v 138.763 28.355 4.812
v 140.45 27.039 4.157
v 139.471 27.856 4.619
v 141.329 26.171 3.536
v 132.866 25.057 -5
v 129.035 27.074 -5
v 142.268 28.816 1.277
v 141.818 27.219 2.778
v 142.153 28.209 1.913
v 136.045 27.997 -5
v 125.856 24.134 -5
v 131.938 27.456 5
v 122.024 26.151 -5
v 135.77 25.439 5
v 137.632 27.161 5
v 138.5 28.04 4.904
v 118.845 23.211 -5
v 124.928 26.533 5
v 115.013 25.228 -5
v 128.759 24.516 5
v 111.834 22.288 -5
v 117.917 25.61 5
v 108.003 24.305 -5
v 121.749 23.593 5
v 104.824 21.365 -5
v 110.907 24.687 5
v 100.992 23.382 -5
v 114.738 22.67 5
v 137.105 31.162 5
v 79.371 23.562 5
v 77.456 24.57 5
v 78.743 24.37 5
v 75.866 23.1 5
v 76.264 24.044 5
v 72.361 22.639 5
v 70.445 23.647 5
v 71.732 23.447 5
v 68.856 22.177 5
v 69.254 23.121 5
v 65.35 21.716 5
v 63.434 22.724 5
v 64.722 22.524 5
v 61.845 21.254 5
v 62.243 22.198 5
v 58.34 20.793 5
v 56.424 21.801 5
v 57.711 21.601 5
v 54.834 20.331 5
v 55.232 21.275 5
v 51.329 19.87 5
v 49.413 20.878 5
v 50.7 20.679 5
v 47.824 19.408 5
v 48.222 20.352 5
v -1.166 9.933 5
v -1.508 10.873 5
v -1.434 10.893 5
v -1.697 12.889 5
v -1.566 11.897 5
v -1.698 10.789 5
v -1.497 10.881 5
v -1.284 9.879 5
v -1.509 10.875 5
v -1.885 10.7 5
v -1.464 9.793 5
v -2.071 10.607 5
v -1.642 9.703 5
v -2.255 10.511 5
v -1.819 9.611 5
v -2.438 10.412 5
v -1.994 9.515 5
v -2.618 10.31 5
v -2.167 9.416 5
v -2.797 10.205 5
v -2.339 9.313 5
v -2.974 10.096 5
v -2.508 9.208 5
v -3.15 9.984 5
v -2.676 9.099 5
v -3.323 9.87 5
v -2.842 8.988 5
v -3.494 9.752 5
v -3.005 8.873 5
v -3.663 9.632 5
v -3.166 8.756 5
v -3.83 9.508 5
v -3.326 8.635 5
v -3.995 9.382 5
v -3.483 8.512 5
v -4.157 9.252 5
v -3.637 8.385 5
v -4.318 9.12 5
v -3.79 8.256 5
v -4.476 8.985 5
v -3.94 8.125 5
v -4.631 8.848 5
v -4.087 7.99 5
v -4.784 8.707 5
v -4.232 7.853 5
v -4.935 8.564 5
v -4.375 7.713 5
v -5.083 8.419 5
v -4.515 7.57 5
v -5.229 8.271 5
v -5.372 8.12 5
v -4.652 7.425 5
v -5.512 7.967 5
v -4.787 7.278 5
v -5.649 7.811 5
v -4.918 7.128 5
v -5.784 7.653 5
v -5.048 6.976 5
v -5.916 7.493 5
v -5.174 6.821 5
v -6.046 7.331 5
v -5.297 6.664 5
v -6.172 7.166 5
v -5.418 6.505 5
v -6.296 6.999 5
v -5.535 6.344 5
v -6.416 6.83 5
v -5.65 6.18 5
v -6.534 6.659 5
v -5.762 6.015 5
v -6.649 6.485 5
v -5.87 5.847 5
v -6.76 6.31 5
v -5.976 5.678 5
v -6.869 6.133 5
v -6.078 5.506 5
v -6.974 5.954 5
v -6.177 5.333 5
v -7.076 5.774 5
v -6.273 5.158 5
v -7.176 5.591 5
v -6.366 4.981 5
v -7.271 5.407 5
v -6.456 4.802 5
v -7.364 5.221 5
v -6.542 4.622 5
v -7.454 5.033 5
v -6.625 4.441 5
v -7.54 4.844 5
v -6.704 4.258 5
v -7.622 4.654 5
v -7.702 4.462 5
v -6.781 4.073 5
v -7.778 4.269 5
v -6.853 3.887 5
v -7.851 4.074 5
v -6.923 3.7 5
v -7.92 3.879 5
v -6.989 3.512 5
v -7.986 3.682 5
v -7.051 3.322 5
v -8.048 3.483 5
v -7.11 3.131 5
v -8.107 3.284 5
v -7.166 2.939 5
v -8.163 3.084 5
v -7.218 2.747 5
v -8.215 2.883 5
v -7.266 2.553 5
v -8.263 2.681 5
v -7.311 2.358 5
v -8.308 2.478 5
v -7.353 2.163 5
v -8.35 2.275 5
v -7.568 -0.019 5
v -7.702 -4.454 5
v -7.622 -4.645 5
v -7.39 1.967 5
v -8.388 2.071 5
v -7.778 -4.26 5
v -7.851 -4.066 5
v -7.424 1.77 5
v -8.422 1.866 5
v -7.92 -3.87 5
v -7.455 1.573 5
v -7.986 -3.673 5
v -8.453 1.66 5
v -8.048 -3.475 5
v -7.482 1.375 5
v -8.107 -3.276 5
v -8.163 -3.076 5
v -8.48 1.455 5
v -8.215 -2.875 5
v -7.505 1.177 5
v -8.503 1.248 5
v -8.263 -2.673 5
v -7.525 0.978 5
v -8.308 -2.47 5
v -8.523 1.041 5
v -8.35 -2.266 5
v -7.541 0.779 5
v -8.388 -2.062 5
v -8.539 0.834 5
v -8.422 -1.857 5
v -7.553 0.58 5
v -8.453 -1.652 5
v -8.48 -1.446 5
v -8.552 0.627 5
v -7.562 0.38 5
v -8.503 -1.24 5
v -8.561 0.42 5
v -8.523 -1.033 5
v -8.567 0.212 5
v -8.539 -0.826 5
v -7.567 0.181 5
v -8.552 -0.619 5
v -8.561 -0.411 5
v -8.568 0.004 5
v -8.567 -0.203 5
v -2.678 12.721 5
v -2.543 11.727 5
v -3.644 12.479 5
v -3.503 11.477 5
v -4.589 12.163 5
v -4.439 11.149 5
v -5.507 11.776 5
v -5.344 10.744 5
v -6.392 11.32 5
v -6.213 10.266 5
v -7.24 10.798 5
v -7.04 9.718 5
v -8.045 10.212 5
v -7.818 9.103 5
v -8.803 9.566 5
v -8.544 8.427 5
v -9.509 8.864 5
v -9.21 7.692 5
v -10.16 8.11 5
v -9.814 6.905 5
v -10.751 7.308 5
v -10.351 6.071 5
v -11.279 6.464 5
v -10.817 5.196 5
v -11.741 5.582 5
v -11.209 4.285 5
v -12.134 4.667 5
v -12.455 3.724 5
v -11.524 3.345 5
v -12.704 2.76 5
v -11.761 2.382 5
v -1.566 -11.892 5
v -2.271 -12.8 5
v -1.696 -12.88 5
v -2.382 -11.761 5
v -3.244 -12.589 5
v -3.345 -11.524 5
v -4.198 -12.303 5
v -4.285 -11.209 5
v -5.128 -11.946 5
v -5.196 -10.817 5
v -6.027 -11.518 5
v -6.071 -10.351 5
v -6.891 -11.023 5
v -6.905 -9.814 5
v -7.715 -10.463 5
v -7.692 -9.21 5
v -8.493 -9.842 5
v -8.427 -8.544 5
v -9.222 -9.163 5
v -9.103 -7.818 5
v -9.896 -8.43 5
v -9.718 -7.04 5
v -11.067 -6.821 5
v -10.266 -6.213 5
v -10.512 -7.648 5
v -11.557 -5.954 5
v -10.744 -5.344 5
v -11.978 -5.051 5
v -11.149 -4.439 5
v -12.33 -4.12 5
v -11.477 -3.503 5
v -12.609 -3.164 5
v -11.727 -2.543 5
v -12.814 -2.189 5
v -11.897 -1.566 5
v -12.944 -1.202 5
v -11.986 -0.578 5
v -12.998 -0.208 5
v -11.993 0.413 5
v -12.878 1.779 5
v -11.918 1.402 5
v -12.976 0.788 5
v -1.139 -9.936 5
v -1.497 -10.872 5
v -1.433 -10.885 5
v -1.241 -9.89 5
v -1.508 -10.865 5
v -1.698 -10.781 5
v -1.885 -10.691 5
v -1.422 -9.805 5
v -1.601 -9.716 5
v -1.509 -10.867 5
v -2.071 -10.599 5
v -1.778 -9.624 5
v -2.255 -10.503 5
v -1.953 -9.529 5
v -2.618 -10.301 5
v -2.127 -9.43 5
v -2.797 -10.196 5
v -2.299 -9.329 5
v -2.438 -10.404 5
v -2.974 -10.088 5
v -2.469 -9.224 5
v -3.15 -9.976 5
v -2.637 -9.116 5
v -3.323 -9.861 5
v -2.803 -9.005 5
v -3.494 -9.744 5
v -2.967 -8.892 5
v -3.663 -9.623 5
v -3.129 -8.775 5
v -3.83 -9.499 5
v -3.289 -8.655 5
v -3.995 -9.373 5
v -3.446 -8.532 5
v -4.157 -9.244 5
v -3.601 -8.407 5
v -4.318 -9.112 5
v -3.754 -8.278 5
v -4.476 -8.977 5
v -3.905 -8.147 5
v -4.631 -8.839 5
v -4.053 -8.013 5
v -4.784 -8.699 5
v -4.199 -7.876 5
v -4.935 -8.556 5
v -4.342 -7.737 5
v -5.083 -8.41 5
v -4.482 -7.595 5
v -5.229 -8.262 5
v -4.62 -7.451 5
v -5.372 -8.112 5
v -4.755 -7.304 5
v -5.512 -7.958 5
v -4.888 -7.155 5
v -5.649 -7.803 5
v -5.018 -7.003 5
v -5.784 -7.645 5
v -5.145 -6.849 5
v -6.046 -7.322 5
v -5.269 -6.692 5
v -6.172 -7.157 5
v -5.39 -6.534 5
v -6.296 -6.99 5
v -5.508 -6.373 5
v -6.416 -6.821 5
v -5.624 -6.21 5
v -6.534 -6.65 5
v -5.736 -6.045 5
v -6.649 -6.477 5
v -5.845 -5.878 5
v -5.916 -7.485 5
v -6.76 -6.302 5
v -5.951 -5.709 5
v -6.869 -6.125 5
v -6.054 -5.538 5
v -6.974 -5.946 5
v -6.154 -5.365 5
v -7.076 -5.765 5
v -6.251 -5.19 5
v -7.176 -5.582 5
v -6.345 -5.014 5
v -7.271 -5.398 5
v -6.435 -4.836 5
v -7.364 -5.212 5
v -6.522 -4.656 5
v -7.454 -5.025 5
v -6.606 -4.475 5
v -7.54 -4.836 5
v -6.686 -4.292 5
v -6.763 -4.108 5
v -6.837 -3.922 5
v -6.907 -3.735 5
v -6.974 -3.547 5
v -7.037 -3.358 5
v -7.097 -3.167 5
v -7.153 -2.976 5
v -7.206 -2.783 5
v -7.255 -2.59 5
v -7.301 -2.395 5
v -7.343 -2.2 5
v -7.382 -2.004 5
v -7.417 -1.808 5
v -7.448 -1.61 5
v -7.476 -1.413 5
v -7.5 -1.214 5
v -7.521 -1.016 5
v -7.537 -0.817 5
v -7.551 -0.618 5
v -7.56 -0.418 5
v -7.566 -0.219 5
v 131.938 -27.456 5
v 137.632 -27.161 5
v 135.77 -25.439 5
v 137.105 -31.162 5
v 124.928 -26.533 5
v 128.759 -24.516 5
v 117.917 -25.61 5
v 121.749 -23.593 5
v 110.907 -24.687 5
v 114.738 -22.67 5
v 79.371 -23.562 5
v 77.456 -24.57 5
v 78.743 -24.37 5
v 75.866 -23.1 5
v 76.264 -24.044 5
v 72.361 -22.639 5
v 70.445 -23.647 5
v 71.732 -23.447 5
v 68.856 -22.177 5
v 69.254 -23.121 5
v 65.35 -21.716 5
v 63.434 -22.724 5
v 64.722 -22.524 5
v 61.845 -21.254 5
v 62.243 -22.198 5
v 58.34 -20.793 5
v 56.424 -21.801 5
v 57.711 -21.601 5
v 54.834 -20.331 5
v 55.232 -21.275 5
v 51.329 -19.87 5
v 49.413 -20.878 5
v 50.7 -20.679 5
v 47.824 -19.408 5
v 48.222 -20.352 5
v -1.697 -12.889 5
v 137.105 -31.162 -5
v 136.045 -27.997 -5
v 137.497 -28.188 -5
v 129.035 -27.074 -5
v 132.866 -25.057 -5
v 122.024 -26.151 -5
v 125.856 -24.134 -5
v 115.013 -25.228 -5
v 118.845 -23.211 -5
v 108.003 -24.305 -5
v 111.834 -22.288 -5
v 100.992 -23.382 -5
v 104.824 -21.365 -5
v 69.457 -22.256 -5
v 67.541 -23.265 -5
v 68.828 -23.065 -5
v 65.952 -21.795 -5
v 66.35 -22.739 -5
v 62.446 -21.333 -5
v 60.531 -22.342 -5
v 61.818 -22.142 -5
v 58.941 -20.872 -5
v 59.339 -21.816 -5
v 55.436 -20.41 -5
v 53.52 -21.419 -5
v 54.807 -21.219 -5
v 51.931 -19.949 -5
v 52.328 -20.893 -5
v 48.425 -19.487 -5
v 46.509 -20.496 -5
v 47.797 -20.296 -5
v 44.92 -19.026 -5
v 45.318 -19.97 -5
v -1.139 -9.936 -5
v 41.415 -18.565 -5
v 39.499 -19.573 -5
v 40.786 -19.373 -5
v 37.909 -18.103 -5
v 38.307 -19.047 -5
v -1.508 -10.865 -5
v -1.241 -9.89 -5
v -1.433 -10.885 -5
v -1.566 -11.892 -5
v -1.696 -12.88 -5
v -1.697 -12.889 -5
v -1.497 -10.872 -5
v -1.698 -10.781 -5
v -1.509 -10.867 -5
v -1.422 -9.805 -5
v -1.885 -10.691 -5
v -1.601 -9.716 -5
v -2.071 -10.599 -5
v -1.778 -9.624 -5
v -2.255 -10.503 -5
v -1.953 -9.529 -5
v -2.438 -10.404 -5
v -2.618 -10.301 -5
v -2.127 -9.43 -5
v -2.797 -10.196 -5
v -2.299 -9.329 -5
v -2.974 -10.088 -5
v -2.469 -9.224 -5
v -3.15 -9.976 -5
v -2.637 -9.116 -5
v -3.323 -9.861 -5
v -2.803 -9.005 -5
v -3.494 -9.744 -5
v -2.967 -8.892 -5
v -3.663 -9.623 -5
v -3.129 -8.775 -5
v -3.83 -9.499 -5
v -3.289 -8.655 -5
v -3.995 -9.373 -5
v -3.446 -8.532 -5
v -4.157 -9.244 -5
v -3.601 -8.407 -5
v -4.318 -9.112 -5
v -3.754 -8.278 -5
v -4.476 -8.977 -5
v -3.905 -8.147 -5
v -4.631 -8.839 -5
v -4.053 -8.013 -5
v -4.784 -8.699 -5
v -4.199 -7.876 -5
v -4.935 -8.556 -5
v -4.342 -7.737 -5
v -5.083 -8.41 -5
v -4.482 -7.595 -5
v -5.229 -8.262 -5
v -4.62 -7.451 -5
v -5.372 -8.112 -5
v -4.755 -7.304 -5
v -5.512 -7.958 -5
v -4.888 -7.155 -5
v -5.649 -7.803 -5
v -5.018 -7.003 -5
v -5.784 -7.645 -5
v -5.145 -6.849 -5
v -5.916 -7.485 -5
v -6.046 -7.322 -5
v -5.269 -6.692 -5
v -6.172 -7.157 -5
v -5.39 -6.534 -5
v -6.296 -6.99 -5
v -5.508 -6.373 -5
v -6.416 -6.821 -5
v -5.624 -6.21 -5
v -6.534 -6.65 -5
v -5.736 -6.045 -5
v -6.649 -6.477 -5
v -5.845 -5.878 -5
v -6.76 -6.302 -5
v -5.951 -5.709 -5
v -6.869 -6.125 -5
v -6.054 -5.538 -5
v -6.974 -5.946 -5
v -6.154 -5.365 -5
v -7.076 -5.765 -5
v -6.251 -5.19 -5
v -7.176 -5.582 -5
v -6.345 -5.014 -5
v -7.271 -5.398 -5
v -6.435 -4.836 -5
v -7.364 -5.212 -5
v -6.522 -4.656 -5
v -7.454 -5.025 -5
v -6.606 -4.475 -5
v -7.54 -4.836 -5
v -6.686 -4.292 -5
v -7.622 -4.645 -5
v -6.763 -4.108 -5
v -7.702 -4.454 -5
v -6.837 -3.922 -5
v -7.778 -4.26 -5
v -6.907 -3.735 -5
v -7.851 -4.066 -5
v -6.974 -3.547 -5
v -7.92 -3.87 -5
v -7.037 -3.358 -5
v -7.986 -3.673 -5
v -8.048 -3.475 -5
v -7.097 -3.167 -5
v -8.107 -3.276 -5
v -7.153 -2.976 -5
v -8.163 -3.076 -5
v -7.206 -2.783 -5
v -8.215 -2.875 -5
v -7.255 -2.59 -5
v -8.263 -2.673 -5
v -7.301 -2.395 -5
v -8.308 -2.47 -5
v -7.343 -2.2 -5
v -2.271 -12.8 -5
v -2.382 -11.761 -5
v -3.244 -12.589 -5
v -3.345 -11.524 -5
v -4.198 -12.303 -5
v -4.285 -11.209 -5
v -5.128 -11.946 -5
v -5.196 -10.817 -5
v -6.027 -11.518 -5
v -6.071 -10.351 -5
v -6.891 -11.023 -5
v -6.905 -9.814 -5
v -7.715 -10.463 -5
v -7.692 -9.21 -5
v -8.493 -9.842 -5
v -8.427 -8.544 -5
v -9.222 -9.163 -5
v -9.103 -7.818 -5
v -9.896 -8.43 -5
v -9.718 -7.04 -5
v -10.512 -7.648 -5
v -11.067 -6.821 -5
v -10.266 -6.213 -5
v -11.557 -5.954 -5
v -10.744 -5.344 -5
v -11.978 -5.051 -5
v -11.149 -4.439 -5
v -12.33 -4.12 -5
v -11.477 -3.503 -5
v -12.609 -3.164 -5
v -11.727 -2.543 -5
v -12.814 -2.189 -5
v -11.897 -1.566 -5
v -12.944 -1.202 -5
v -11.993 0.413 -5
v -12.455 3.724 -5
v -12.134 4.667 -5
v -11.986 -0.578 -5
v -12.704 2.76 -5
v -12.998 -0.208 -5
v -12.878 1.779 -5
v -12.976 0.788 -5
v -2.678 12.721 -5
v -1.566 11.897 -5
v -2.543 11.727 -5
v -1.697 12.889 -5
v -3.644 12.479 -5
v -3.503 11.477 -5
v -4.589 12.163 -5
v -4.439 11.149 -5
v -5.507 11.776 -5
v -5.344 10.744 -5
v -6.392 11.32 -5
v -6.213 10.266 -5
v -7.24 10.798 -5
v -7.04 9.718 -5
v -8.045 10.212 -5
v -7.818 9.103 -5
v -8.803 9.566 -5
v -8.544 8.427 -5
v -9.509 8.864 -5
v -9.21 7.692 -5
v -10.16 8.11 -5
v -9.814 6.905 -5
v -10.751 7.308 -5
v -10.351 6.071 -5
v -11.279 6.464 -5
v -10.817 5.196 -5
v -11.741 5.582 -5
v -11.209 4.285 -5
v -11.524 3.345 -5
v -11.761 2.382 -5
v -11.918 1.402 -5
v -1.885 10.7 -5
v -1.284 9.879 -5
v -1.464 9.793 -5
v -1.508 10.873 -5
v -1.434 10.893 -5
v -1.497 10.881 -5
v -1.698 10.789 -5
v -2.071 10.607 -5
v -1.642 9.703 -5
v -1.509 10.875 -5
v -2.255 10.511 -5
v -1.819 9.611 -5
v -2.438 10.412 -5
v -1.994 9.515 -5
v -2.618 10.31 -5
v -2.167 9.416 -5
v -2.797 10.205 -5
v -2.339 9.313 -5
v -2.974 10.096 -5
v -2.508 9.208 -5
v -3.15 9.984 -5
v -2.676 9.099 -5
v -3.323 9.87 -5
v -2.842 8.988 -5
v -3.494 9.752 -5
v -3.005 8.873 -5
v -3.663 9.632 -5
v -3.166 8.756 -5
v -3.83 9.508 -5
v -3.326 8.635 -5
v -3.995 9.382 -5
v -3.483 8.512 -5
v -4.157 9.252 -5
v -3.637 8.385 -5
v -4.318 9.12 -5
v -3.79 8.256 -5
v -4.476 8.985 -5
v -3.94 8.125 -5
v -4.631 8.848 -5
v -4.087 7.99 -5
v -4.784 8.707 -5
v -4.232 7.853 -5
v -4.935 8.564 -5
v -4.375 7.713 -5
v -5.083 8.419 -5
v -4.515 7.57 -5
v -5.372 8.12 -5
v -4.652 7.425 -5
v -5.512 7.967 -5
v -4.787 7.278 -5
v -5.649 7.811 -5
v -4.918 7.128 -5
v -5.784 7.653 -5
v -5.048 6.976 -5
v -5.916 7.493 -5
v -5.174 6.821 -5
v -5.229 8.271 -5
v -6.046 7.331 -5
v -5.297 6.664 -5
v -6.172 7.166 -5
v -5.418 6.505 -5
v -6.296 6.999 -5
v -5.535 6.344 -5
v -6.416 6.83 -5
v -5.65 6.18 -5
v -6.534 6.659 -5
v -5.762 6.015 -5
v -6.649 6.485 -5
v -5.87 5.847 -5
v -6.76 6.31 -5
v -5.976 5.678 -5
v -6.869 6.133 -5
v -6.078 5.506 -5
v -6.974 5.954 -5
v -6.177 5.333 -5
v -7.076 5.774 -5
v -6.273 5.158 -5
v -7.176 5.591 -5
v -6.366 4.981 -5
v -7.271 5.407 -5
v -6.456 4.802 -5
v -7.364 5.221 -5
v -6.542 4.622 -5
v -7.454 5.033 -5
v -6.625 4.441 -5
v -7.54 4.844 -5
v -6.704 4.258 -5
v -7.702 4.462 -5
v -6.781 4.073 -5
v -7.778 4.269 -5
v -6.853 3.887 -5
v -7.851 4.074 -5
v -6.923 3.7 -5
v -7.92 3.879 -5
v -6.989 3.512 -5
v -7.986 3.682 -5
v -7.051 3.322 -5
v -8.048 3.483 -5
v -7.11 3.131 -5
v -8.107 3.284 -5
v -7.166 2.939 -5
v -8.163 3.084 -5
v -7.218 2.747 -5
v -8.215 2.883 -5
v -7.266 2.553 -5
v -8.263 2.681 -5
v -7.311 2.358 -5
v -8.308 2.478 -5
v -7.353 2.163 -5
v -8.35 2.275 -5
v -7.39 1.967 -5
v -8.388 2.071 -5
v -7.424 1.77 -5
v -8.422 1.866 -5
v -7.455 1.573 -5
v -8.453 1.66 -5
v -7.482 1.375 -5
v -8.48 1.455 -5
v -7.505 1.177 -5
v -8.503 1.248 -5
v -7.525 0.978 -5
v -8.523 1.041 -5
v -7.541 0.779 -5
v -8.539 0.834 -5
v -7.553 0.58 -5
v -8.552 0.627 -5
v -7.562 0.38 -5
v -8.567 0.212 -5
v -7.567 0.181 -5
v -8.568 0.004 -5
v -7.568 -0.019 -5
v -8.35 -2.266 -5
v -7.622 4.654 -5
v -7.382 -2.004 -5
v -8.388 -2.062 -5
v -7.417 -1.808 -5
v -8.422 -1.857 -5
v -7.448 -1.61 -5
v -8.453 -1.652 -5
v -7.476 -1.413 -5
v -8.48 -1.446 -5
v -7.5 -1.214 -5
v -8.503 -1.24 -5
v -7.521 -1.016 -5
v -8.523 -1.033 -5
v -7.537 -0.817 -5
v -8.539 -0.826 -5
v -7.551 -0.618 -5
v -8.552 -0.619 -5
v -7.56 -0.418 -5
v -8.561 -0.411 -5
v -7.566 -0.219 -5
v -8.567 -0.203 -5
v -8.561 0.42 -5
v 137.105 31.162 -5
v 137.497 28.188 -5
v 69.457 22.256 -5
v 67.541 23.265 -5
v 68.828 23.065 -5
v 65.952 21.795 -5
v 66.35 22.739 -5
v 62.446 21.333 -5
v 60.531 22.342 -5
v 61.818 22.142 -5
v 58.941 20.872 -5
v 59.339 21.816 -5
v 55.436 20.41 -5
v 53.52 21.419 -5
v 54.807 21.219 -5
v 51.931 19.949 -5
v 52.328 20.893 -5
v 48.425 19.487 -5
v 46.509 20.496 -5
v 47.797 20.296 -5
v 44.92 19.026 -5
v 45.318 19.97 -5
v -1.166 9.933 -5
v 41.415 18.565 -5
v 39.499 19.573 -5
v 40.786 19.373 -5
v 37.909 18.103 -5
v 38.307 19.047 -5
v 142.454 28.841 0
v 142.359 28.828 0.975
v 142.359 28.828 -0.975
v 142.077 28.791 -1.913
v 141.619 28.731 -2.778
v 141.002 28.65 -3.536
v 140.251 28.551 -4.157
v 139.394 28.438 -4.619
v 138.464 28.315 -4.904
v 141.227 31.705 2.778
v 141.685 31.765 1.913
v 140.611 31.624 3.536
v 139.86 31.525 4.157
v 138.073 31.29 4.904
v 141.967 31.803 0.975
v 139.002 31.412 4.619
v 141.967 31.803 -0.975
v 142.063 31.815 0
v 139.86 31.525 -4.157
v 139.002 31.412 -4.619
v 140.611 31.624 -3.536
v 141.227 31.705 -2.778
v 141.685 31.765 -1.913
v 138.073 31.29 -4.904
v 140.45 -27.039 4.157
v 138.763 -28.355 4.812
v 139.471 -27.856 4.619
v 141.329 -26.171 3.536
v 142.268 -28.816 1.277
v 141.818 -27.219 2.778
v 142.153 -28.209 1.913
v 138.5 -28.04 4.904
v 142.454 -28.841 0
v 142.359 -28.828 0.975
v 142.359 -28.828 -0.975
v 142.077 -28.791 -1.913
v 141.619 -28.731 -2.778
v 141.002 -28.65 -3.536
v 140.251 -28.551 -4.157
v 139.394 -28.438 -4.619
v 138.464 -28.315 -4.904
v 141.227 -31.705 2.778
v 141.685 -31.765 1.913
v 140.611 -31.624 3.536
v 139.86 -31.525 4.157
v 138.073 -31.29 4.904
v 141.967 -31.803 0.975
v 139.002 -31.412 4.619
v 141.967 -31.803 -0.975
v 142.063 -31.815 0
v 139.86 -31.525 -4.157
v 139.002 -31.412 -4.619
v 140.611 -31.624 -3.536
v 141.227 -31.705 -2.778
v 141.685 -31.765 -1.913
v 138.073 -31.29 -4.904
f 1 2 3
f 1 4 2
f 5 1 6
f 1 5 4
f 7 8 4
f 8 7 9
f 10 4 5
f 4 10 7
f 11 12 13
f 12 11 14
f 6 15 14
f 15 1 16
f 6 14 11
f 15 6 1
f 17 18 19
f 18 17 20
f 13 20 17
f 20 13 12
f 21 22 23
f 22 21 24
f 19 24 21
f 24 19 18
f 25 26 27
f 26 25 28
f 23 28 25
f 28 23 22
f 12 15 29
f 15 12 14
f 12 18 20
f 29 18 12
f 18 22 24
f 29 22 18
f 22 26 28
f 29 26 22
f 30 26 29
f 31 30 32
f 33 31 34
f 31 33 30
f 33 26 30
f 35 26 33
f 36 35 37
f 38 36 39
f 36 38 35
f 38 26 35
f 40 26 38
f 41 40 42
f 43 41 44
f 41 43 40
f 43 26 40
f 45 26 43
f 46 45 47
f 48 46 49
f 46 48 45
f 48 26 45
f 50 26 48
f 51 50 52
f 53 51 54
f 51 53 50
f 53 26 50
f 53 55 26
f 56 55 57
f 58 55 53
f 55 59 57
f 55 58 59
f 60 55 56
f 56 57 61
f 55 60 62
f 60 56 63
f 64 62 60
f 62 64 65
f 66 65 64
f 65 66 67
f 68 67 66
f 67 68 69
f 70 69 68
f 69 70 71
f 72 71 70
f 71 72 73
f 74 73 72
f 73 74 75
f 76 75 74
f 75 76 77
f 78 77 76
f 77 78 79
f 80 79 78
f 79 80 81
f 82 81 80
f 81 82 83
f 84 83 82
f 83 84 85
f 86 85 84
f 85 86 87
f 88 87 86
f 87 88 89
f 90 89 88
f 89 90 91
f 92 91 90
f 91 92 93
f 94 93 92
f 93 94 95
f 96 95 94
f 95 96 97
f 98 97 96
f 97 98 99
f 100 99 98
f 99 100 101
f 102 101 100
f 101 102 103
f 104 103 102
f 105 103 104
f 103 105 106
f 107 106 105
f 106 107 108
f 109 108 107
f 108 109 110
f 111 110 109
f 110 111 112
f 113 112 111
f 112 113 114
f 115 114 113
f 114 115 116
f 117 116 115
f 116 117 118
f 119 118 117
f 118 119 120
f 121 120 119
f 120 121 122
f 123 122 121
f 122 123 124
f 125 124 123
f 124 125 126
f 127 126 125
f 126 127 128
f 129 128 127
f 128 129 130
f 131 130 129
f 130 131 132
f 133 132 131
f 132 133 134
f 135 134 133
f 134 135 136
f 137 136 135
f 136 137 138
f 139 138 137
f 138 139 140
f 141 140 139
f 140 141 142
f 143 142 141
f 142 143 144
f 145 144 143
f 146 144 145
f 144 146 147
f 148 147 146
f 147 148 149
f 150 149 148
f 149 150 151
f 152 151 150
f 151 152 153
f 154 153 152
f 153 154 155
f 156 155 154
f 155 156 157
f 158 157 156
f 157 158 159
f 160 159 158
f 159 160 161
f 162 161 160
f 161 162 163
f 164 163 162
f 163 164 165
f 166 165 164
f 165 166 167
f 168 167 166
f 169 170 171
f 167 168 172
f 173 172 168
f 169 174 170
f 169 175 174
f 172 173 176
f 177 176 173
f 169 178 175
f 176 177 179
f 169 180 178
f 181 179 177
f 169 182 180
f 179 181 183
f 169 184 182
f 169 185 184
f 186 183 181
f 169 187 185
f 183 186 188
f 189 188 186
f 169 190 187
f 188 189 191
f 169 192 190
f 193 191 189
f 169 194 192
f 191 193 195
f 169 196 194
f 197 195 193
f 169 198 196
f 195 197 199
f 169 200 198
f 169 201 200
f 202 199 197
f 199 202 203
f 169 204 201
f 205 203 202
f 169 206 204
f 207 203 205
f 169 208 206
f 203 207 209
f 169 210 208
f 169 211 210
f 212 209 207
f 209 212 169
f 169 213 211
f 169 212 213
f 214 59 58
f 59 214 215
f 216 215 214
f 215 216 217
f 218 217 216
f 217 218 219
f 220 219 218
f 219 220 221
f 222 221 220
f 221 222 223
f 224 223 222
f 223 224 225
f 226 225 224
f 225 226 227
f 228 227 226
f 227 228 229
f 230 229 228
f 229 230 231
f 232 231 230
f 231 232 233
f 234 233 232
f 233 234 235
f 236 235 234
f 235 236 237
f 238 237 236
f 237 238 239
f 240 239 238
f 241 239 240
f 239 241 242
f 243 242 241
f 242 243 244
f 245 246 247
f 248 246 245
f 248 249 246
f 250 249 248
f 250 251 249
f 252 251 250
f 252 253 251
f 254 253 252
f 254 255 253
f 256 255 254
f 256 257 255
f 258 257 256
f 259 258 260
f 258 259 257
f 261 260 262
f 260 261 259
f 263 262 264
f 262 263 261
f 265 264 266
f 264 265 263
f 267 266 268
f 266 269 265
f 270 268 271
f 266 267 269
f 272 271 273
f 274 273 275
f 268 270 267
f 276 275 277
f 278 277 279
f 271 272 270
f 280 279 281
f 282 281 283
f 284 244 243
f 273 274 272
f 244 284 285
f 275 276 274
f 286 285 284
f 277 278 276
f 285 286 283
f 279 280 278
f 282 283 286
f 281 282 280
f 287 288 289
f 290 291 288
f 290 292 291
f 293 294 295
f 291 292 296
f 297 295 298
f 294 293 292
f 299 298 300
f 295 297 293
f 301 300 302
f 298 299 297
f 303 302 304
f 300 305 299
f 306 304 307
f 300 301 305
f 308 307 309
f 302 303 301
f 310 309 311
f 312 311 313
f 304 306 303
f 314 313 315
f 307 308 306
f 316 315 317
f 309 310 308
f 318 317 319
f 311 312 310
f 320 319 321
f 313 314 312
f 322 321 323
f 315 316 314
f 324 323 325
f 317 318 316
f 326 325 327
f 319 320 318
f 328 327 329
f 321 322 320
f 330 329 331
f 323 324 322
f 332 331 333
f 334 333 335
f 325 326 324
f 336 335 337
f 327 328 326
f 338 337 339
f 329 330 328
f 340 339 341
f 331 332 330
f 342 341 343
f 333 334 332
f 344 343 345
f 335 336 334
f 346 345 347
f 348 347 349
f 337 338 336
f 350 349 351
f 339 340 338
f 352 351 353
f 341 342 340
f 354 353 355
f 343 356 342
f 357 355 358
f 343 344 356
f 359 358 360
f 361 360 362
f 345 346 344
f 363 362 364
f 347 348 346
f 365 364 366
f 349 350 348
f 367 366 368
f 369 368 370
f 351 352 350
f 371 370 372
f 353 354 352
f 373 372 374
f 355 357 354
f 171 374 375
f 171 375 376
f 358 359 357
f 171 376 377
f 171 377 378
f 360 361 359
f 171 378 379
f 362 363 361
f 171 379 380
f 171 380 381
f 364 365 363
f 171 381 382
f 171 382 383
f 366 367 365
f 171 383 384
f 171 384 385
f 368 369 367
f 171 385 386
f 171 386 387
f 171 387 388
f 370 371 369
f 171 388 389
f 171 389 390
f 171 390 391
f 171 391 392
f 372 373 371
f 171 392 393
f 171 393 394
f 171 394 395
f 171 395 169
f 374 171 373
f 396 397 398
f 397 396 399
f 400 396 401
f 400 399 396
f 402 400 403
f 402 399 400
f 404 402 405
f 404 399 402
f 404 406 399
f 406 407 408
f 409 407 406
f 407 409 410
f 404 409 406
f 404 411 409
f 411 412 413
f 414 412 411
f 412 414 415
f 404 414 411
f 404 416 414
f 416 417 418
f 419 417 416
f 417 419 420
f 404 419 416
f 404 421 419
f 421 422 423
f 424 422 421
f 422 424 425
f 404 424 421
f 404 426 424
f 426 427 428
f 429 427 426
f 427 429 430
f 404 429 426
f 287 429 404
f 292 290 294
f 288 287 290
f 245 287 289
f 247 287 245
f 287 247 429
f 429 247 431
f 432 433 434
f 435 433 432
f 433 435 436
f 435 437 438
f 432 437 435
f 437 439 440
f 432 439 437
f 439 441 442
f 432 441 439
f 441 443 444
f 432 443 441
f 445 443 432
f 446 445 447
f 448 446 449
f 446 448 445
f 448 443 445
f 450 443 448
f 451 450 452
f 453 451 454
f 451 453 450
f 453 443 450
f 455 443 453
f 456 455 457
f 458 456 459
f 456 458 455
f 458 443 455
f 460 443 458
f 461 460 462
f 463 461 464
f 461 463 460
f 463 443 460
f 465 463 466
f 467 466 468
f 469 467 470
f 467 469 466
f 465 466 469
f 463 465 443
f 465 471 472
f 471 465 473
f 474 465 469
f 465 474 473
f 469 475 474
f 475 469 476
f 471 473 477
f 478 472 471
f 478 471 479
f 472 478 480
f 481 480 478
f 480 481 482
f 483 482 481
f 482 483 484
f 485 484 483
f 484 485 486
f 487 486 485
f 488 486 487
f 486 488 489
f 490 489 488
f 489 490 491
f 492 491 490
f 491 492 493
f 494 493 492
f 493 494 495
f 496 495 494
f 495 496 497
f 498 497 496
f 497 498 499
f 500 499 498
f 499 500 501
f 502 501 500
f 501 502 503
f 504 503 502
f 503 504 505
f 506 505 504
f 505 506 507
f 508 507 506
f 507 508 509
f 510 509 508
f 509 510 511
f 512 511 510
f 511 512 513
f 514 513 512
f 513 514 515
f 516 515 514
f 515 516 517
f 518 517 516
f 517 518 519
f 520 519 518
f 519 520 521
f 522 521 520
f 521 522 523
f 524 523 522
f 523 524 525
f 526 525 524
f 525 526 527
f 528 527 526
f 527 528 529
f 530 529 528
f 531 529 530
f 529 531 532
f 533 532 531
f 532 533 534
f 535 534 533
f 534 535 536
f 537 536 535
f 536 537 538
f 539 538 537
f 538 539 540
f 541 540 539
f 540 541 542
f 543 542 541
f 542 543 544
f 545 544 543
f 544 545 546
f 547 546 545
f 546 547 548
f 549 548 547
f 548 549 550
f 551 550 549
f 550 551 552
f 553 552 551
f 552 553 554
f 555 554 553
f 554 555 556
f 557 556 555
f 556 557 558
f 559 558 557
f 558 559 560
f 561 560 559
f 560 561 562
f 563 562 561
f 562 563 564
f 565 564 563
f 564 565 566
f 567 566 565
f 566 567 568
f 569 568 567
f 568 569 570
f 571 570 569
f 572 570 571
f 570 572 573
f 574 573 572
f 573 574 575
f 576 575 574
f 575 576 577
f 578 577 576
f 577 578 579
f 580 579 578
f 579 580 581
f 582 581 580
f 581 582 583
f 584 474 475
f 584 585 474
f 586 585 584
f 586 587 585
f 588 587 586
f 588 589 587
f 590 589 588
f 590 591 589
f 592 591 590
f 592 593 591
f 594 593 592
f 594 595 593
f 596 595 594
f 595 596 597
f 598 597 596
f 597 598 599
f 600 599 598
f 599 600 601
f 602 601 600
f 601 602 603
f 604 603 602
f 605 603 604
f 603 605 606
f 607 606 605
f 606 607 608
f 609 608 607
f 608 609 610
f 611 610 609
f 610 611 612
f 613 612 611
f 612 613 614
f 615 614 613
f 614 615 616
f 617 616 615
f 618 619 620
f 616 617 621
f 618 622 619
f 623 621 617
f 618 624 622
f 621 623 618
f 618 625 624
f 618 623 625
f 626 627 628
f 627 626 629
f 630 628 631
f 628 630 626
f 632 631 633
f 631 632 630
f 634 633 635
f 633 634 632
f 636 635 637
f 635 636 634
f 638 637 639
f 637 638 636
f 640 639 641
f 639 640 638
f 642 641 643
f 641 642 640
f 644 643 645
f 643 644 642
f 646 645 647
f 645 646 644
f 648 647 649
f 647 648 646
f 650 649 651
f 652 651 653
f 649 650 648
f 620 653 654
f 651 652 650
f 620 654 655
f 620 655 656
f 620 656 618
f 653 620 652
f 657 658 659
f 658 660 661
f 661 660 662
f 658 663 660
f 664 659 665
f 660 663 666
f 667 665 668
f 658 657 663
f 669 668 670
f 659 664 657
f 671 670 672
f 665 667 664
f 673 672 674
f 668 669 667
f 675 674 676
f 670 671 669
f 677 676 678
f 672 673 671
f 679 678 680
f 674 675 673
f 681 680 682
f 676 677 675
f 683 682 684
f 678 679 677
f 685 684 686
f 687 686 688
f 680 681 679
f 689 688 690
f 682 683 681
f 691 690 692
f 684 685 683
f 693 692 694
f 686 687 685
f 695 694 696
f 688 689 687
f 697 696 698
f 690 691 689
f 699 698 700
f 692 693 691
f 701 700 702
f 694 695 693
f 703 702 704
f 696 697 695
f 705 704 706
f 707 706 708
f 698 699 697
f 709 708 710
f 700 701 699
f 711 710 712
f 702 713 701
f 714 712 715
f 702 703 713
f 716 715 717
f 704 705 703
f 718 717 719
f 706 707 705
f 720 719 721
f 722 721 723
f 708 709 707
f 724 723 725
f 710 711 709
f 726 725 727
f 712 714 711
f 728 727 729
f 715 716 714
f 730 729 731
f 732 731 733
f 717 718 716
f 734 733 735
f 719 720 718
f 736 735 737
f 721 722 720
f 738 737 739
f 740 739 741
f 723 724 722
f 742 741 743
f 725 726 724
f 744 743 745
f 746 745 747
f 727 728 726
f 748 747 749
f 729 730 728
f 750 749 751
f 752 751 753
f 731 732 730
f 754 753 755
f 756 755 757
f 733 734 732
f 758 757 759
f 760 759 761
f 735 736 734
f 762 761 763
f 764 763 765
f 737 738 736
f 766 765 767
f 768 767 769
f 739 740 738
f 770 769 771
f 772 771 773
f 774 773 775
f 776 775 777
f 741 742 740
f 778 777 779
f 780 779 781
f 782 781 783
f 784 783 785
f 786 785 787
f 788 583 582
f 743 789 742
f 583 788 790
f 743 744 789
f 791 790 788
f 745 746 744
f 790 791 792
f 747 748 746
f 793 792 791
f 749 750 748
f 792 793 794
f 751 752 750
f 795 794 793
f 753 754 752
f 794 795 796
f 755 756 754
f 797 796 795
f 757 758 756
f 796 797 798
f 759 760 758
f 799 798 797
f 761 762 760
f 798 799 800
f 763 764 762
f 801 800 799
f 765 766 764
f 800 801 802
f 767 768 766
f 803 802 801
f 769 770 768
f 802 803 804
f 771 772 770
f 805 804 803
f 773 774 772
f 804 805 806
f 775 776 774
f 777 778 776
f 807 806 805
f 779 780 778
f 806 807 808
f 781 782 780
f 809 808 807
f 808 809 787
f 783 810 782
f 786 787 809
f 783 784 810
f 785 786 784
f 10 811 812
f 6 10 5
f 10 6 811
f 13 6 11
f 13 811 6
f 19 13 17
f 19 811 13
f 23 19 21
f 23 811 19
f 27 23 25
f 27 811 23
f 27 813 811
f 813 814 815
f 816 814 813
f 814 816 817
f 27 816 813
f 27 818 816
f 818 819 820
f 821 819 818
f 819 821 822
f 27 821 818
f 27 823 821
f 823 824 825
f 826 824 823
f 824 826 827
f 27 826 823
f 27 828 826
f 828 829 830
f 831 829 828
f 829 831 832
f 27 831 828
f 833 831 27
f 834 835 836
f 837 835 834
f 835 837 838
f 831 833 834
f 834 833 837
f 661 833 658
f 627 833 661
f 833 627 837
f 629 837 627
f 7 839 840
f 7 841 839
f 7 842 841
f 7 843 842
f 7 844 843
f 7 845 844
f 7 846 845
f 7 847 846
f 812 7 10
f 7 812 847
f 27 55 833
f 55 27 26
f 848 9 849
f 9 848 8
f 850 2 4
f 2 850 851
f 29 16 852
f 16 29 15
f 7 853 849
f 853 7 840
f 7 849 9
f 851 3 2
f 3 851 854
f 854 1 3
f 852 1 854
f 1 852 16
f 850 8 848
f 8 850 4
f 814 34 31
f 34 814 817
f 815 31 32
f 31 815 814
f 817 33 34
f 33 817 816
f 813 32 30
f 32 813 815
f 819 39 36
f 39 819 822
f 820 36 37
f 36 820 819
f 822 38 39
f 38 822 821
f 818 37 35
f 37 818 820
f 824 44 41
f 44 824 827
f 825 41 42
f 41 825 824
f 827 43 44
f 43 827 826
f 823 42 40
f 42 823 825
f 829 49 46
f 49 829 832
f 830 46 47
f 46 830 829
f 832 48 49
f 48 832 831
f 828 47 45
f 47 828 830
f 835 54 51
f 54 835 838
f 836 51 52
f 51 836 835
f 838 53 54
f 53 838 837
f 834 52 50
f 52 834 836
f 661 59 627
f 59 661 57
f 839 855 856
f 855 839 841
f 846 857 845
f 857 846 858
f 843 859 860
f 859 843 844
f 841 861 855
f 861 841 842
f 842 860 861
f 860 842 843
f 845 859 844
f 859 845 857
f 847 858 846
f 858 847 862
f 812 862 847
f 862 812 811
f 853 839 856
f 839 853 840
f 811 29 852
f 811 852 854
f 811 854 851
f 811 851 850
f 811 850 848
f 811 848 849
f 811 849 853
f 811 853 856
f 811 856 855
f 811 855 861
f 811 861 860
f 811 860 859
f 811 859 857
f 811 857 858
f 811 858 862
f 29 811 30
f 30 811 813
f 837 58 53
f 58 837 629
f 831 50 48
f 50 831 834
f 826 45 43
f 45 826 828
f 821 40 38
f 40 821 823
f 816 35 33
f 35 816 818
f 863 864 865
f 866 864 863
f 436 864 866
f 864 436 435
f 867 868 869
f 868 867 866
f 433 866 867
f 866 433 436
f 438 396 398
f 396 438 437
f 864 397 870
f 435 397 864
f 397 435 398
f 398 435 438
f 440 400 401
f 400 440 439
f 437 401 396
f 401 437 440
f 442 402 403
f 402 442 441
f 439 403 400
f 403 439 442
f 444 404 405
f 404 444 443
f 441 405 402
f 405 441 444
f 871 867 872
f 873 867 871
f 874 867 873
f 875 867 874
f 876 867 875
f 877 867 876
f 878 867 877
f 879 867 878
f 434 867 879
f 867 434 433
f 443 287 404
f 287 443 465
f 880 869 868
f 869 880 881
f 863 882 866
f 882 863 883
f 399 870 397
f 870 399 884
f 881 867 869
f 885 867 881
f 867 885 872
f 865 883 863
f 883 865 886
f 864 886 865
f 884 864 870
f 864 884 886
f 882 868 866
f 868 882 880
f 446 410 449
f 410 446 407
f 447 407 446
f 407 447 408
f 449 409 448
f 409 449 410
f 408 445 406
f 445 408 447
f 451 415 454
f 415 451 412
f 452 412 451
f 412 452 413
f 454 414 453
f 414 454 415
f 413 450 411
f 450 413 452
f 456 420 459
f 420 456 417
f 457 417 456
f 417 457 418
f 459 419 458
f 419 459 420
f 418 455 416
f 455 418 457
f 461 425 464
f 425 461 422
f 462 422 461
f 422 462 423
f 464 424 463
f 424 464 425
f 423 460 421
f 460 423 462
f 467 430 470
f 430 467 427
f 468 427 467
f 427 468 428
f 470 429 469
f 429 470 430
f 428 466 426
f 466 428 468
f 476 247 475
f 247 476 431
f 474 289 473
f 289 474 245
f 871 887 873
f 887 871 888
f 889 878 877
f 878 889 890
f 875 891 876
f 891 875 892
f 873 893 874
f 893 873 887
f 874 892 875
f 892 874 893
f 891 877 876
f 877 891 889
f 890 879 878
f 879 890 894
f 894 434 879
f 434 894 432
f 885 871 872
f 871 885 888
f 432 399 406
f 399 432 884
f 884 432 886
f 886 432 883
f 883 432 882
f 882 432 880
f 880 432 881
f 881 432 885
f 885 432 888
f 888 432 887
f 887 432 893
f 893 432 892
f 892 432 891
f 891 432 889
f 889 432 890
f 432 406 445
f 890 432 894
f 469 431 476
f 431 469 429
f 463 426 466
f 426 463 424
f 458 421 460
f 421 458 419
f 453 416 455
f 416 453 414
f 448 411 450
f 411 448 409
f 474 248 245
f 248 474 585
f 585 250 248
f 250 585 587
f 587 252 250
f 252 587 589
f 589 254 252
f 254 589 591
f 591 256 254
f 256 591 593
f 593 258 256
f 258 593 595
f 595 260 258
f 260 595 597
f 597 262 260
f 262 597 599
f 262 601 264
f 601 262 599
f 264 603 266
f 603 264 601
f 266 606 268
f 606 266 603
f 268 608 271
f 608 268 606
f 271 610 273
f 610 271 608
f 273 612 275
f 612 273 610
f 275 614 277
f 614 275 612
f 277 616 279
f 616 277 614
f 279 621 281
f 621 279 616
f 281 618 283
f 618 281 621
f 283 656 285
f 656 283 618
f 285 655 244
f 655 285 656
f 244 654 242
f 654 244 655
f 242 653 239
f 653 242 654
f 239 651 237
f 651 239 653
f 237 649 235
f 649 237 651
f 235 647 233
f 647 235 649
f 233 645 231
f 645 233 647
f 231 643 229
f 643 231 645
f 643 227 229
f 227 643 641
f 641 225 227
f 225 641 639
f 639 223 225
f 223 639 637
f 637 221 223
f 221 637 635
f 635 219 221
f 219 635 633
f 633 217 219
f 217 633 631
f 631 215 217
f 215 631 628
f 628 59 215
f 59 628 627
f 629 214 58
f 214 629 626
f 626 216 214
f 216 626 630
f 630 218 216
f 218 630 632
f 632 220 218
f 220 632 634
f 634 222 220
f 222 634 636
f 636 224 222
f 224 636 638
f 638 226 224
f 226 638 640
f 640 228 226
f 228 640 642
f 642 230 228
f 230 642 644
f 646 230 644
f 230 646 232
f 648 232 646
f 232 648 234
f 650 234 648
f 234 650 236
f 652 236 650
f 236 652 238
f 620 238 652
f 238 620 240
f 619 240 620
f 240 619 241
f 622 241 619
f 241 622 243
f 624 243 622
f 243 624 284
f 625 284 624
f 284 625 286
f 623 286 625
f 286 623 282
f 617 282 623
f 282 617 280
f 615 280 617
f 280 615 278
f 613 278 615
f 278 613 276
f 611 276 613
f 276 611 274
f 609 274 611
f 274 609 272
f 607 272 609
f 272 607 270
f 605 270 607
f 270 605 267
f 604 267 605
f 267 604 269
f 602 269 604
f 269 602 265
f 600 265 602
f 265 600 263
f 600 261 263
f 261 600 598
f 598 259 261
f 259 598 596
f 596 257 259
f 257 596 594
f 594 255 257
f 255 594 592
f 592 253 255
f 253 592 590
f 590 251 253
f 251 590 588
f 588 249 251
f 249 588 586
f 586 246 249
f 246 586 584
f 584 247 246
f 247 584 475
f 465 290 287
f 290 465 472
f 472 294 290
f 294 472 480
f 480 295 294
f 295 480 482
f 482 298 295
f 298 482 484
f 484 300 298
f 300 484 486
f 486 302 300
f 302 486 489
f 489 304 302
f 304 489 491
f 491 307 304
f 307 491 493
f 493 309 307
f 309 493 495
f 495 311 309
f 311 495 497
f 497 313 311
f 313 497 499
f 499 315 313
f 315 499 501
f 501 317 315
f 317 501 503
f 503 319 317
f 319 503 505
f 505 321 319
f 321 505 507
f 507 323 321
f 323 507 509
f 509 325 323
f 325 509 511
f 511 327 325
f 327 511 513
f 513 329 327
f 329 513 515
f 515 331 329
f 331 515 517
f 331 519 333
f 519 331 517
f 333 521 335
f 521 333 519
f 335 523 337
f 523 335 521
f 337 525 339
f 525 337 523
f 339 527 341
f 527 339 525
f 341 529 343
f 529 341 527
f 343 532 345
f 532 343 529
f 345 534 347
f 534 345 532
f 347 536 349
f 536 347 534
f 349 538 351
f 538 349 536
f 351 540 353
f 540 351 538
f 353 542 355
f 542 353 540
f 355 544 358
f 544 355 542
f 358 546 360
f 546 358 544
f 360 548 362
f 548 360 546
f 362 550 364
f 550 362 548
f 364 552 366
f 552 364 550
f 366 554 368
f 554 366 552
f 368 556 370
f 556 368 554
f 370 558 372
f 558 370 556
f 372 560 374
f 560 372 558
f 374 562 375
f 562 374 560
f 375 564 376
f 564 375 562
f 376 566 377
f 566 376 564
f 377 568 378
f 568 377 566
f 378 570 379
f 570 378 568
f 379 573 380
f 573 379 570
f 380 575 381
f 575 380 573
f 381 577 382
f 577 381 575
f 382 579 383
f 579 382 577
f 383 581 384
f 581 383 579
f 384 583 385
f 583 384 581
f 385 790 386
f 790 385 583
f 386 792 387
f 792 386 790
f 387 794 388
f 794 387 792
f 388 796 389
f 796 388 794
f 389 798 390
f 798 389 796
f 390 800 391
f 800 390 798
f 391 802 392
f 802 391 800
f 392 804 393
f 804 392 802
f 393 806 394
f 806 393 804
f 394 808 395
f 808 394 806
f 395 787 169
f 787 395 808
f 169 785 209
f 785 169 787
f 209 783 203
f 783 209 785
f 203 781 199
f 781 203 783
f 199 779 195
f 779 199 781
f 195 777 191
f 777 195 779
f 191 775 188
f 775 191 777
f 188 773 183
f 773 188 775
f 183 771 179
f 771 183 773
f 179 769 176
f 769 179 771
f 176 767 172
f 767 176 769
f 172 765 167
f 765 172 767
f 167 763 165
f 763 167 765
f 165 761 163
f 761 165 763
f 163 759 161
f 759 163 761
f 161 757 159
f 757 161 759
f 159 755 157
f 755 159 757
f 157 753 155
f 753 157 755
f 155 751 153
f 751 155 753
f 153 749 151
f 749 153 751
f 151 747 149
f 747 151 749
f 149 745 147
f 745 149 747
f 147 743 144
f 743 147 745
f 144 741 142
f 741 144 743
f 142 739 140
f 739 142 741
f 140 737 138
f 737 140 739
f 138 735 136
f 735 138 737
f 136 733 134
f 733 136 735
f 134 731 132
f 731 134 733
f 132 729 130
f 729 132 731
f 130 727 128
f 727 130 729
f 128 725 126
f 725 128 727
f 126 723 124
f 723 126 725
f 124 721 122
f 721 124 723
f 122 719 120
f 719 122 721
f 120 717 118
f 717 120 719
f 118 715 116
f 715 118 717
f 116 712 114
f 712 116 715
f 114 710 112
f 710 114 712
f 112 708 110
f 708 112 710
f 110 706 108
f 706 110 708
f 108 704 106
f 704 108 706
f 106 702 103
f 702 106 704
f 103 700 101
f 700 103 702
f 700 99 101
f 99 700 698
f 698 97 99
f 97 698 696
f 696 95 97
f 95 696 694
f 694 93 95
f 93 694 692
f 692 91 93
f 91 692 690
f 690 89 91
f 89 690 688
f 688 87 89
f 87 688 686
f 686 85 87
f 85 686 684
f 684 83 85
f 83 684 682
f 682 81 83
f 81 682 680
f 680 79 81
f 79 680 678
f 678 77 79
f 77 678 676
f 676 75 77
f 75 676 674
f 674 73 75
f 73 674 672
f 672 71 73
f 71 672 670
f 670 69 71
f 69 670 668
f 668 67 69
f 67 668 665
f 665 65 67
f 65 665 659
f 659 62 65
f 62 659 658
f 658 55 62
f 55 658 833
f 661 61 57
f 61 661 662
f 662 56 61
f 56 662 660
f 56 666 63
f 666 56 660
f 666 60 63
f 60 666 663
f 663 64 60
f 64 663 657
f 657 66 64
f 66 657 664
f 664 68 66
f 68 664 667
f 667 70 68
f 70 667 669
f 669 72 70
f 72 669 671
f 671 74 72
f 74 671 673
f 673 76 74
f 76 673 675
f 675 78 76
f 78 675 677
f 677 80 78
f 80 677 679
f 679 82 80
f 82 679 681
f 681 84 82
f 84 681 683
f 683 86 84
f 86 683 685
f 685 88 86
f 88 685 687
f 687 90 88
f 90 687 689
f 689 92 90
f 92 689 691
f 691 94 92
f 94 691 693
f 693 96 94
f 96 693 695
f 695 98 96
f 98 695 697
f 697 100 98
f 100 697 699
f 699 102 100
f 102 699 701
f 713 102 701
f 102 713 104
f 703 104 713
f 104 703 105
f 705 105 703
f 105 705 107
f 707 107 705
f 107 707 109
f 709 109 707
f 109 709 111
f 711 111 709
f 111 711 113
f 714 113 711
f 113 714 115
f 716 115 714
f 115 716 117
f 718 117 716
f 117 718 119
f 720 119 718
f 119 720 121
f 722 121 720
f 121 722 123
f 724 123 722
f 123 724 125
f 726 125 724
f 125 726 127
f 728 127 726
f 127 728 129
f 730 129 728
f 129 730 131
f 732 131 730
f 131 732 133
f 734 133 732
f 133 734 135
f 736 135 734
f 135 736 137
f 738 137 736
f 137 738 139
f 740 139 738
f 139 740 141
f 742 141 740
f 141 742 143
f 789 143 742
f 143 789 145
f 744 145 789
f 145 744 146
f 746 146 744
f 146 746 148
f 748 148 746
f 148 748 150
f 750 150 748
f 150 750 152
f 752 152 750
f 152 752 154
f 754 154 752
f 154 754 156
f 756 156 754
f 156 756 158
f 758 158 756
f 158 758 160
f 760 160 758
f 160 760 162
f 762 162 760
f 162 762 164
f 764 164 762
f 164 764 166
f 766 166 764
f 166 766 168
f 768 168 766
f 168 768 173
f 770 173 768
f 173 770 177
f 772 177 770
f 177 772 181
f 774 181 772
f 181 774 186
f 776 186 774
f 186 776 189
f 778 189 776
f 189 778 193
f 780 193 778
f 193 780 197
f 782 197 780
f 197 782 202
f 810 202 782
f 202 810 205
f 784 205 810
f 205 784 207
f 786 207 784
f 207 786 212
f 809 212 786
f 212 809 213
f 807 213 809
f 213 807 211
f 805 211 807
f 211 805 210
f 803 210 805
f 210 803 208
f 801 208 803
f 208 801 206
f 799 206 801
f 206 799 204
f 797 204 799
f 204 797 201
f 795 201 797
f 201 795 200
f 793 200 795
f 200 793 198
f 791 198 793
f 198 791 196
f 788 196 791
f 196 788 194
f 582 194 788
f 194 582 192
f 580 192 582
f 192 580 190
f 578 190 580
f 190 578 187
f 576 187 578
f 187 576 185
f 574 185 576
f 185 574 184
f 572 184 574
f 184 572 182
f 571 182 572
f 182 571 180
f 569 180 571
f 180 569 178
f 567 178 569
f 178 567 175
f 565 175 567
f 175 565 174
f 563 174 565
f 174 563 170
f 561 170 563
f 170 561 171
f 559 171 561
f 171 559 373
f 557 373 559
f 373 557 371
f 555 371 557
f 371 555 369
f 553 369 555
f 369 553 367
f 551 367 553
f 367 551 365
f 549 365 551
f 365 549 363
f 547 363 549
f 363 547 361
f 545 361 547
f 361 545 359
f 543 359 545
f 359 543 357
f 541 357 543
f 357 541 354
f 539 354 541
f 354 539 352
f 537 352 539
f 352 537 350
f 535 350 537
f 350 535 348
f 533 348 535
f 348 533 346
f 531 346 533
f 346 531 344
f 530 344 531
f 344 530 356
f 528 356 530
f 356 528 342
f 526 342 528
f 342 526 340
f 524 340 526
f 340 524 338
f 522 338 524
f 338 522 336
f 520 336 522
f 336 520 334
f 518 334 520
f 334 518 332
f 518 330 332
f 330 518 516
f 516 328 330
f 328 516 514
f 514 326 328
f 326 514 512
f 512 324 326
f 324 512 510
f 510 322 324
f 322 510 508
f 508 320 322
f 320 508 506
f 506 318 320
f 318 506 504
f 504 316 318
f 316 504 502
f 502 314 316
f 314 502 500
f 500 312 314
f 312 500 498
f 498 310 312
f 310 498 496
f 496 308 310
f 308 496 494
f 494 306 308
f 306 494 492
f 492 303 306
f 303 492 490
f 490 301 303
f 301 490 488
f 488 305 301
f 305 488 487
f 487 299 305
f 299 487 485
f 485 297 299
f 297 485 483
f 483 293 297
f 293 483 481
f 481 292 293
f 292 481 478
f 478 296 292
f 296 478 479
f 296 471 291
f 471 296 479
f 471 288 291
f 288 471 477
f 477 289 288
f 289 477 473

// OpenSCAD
// file: ../lib/arc.scad
/*
r: radius
b: thickness
t: theta
*/
module arc(r,b,t){
	//$fs=b*.2;
	a=(r+b)*2;
	rot=function(t)[cos(t)*a,sin(t)*a];
	intersection(){
		difference(){circle(r+b/2);circle(r-b/2);}
		polygon([
			for(i=[0:floor(abs(t)/120)])rot(120*i*sign(t)),
			rot(t),[0,0]
		]);
	}
}

// distance arc
module darc(d,b,t){
	//$fs=b*.2;
	r=sqrt(d*d/(2*(1-cos(t))));
	if(r!=1/0) translate([d,0])rotate((180-abs(t))/2*sign(t))translate([-r,0])arc(r,b,t);
	else translate([0,-b/2])square([d,b]);
	//circle(d=b);
	//translate([d,0])circle(d=b,$fs=b*.2);
}
// main file
use <../lib/arc.scad>;
$fa=1;$fs=1;

width=10;
thick=3;
length=150;

dist=10;
theta=15;
h_thick=1;
inner_theta_p=.8;

tooth=5;
phi=45;
tooth_n=5;

module bone(t=thick){
	rotate([-90,0,0])scale([1,1,sign(t)])linear_extrude(abs(t)){
		translate([0,-width/2])square([length-width,width]);
		translate([length-width,0])circle(width/2);
	}
}

module half(){
	rotate([0,0,theta/2])translate([0,dist,0]){
		bone();
		intersection(){
			bone(-dist);
			translate([length-width,0,0])rotate([0,phi,0])for(i=[0:tooth_n-1])translate([-i*tooth,0,0])rotate([0,0,45])cube([tooth*sqrt(2)/2,tooth*sqrt(2)/2,100],center=true);
		}
		intersection(){
			bone(thick+tooth);
			translate([length/2,0,0])rotate([0,phi,0])for(i=[0:tooth_n-1])translate([-i*tooth,thick,0])rotate([0,0,45])cylinder(d=tooth/2,h=100,center=true);
		}
	}
}
module hinge(){
	translate([0,0,-width/2])linear_extrude(width){
		//rotate(90+theta/2)arc(dist+h_thick/2,h_thick,180-theta);
		translate([-sin(theta/2)*dist,-cos(theta/2)*(dist+h_thick/2),0])rotate(90){
			$fs=h_thick*.2;
			darc(dist*cos(theta/2)*2+h_thick,h_thick,(180-theta)*inner_theta_p);
			circle(d=h_thick);
			translate([dist*cos(theta/2)*2+h_thick,0])circle(d=h_thick);
		}
		rotate(90+theta/2)arc(dist+thick-h_thick/2,h_thick,180-theta);
	}
}


half();scale([1,-1,1])half();
hinge();
